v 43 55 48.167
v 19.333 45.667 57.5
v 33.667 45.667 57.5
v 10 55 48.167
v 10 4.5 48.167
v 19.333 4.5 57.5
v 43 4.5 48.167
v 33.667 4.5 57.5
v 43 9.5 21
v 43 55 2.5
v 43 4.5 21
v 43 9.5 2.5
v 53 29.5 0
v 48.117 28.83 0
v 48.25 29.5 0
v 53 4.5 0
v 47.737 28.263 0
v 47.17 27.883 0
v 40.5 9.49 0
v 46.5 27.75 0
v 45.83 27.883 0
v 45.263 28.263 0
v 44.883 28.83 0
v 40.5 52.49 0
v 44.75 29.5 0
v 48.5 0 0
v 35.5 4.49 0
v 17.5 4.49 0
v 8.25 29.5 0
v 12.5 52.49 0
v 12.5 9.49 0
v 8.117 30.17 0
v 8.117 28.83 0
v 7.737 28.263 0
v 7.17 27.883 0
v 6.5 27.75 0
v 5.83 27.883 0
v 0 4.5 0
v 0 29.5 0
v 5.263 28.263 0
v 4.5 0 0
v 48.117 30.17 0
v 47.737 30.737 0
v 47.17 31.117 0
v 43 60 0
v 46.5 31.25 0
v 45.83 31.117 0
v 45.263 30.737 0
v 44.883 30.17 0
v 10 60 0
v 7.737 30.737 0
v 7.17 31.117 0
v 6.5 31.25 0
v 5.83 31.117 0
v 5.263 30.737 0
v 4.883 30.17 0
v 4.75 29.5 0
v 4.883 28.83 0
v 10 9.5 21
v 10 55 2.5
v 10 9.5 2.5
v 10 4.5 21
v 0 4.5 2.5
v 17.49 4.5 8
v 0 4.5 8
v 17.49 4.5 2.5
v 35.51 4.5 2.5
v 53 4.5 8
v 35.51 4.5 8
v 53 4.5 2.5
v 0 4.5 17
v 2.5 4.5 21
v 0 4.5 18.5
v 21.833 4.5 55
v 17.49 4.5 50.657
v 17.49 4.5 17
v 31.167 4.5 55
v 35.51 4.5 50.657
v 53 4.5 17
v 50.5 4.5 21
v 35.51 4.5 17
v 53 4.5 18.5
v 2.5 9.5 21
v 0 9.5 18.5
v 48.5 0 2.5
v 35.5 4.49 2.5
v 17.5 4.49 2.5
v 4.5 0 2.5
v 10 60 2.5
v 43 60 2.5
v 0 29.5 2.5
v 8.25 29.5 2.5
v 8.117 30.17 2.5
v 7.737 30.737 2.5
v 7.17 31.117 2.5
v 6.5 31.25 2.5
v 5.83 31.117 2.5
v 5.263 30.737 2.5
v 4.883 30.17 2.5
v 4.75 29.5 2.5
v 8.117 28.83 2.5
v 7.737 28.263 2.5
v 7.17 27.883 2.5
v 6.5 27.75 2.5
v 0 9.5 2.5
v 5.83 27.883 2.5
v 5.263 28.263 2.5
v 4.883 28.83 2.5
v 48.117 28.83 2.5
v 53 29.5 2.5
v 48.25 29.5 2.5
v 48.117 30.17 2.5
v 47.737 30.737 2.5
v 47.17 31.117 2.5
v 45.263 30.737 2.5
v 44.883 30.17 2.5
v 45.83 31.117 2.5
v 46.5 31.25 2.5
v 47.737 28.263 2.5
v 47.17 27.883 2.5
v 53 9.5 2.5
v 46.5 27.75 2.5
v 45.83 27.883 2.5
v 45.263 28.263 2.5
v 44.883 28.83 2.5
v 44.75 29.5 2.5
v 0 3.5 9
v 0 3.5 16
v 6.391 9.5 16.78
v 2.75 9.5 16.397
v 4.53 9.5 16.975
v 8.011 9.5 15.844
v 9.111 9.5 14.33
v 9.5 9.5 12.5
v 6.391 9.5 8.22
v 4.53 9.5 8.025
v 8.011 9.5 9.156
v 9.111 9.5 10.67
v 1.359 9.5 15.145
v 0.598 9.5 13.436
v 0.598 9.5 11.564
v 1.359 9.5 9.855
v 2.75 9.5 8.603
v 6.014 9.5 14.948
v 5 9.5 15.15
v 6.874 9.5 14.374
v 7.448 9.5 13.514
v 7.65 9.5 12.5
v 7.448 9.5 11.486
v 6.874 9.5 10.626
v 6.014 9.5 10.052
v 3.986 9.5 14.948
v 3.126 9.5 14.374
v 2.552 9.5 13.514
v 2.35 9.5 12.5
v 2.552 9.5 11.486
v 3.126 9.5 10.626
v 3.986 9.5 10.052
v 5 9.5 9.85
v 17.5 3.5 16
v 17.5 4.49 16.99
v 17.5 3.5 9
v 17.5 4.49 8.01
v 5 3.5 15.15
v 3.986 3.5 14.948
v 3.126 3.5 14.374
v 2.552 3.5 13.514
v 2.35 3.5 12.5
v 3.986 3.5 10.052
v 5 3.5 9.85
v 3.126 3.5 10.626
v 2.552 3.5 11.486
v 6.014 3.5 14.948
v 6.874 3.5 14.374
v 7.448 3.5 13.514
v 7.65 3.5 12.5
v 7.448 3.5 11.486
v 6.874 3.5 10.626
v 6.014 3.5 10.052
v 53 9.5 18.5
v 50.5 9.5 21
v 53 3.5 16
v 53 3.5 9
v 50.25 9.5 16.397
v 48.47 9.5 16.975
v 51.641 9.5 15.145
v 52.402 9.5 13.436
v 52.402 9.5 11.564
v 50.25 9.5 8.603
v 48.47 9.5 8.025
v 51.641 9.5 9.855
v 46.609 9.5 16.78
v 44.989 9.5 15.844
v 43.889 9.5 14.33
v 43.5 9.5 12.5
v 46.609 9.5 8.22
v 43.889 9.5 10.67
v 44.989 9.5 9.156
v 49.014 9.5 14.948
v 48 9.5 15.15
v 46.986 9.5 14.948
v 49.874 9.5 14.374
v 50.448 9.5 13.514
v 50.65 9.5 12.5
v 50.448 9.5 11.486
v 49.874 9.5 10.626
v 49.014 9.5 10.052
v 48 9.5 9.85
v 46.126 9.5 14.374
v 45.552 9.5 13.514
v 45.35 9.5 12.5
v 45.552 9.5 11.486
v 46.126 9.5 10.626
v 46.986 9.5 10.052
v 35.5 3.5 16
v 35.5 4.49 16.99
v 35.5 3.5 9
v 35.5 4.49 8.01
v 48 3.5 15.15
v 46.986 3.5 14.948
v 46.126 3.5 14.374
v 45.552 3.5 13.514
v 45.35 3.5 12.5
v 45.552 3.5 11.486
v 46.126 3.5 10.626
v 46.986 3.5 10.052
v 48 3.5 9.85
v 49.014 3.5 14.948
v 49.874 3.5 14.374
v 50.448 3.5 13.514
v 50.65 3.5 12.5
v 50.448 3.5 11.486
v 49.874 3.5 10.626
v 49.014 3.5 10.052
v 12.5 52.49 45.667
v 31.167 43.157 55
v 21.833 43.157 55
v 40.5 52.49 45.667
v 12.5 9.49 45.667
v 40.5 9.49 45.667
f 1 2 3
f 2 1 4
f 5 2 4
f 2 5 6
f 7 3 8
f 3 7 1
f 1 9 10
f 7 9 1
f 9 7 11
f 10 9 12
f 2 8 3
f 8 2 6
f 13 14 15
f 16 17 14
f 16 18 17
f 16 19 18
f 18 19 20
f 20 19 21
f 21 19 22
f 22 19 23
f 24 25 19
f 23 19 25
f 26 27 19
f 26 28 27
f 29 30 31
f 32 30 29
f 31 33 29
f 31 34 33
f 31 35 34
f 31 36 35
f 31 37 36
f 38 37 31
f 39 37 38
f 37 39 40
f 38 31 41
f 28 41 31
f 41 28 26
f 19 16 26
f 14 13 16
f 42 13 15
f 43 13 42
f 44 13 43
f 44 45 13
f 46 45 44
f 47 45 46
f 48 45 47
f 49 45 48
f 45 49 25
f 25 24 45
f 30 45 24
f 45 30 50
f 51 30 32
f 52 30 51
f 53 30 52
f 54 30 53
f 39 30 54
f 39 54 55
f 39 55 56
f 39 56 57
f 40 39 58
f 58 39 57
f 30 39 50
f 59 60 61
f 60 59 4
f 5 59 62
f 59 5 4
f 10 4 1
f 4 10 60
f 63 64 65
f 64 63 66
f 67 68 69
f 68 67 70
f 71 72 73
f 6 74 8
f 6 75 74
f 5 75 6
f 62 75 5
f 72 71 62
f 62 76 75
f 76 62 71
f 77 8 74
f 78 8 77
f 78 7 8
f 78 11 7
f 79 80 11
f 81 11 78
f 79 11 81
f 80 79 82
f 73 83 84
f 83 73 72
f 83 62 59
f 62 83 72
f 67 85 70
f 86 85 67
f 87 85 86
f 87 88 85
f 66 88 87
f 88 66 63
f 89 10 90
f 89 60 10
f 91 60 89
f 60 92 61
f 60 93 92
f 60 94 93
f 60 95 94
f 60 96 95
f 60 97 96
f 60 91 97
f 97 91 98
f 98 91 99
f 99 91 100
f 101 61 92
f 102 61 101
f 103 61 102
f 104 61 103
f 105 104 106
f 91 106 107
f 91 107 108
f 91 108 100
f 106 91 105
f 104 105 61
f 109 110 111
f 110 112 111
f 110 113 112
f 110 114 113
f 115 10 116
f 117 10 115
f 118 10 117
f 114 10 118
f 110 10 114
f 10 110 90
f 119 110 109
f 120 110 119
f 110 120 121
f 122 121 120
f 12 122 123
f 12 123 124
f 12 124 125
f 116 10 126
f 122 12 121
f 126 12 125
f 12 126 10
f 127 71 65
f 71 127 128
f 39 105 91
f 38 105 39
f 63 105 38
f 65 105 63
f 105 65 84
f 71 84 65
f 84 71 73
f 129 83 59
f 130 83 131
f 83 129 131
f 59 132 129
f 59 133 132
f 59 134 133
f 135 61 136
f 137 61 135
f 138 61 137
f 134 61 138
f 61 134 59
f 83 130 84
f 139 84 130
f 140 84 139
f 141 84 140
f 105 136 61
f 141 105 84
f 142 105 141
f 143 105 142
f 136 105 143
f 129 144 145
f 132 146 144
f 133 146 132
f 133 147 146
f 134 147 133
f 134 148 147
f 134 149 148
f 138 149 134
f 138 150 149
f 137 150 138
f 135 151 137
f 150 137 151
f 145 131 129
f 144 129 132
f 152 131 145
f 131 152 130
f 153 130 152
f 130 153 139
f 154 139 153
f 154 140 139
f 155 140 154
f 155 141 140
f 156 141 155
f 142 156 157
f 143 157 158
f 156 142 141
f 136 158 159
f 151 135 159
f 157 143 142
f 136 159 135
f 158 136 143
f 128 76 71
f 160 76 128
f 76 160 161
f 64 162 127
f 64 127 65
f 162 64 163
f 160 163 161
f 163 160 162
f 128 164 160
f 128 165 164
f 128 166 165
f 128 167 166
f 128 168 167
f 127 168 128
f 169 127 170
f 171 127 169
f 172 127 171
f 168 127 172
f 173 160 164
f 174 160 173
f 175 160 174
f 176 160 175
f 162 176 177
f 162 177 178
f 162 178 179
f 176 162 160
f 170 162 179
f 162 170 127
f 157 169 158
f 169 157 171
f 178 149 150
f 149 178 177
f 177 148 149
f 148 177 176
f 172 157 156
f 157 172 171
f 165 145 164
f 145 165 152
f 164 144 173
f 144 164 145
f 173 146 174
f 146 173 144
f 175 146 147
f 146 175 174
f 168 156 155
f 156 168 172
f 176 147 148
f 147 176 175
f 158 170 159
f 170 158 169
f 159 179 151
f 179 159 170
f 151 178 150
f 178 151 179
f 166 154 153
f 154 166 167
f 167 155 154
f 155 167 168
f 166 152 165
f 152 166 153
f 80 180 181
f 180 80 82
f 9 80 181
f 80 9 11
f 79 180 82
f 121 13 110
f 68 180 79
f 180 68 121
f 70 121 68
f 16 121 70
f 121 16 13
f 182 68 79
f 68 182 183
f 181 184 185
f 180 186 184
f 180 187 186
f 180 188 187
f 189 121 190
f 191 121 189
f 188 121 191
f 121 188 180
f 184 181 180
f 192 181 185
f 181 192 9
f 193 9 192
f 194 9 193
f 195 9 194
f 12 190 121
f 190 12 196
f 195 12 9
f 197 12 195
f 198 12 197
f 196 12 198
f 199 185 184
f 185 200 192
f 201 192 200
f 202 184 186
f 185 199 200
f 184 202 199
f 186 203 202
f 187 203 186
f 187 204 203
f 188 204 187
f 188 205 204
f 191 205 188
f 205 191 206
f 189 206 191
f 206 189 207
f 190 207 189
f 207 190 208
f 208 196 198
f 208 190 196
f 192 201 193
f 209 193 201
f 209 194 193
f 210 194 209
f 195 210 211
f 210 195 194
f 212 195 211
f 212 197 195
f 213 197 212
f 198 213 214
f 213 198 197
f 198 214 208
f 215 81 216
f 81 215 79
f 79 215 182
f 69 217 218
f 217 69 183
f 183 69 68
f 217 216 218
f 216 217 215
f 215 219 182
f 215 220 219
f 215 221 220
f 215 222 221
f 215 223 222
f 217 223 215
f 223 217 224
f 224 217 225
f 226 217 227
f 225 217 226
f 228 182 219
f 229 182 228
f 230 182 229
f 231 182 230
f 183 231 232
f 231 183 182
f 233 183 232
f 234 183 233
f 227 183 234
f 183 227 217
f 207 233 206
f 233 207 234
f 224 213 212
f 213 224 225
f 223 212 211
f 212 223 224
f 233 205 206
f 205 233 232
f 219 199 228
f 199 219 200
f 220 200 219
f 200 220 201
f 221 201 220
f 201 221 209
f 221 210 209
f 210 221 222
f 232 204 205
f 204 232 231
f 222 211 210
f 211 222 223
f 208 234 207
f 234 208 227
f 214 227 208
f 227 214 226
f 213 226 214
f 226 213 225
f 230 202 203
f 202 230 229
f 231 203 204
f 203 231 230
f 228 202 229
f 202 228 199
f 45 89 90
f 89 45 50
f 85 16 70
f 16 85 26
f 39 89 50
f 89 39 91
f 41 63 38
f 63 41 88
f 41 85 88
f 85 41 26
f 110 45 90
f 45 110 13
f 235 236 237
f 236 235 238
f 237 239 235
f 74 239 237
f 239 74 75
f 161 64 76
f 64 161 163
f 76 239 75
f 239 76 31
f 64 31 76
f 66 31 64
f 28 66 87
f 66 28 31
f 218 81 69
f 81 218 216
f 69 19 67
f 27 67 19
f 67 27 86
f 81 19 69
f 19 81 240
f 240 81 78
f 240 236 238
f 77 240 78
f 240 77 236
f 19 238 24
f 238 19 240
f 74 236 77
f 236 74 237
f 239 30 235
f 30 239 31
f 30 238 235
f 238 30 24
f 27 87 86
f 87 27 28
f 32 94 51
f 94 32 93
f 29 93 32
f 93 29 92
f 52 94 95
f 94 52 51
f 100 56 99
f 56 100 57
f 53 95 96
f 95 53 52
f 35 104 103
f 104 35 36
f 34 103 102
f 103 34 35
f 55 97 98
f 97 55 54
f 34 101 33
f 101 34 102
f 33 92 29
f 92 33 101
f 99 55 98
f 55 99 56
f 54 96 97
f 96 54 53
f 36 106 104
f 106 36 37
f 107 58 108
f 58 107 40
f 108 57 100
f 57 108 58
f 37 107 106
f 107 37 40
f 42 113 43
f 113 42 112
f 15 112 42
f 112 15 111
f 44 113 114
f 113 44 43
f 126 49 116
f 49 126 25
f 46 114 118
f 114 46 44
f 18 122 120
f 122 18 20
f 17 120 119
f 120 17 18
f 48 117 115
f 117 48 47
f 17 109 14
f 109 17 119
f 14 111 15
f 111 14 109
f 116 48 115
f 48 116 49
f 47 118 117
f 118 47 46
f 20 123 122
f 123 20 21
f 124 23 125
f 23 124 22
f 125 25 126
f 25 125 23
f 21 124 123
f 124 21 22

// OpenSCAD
// preview[view:northeast, tilt:topdiagonal]

/* [Basic] */
// Thickness of walls
t=2.5;
// extra space behind the plug for wires
sock_ex_h=34;   

/* [Advanced] */
sock_w=28;
sock_d=48;
sock_h=21;
// extra faceplate on bottom
sock_ex_b=4.5;
// extra faceplate on top
sock_ex_t=7.5;
sock_fillet=5;

// Overall width
f_w=48+2*t;

/* [Hidden] */
f_d=sock_d+sock_ex_b+sock_ex_t;
f_corner=(f_w-sock_w-2*t)/2;

e=0.01;

power_plug();

module mount_screw() {
  // screw hole
  translate([0,0,-e]) cylinder(2*t+2*e, d=3.5, $fn=16);
  // nut clearout
  translate([0,0,t+e]) rotate(30) cylinder(sock_h+sock_ex_h+2*t+2*e, d=7, $fn=6);
}

module mount_ear() {
  w=f_corner;
  tt=5;
  
  difference() {
    union() {
      cube_fillet([w,tt,sock_h-t], top=[0,2.5]);
      translate([0,-1,(20-9)/2])
        cube_fillet([w+sock_fillet+t,1,9], bottom=[0,0,1], top=[0,0,1]);
    }
    // M5 screw
    translate([w/2,0,20/2]) rotate([-90]) {
      translate([0,0,-1-e]) cylinder(tt+1+2*e, d=5.3, $fn=16);
      // screw cap
      translate([0,0,5]) cylinder(tt-5+2*e, d=9);
    }
  }
}

module power_plug() {
difference() {
  union() {
    // faceplate
    linear_extrude(height=t) polygon([
      [0,sock_ex_b], [sock_ex_b,0], [f_w-sock_ex_b,0], [f_w,sock_ex_b],
      [f_w,sock_ex_b+25], [f_w-f_corner,f_d], [f_corner,f_d],
      [0,sock_ex_b+25]
    ]);
    // sock body
    translate([f_corner,sock_ex_b,0])
      cube_fillet([sock_w+2*t, sock_d+t, sock_h+sock_ex_h+t],
        top=[sock_w/3,sock_w/3,0,sock_w/3]);

    translate([0,sock_ex_b,t]) {
      // left mounting ear
      mount_ear();
      // right mounting ear
      translate([f_w,0,0]) mirror([1]) mount_ear();
    }
  }
  
  // begin difference
  // main socket hole
  translate([(f_w-sock_w)/2,sock_ex_b-e,-e])
    cube_fillet([sock_w, sock_d, sock_h+sock_ex_h+e],
      vertical=[0,0,sock_fillet,sock_fillet], top=[sock_w/3,sock_w/3,0,sock_w/3]);
  // screw holes
  translate([(f_w-40)/2,25+sock_ex_b,0]) {
    mount_screw();
    translate([40,0,0]) mount_screw();
  }

}
} /* end module power_plug */

/** END OF POWER_PLUG - BEGIN INCLUDES **/
module nut(d,h,horizontal=true){
    cornerdiameter =  (d / 2) / cos (180 / 6);
    cylinder(h = h, r = cornerdiameter, $fn = 6);
    if(horizontal){
        for(i = [1:6]){
            rotate([0,0,60*i]) translate([-cornerdiameter-0.2,0,0]) rotate([0,0,-45]) cube([2,2,h]);
        }
    }
}

module fillet(radius, height=100, $fn=$fn) {
  if (radius > 0) {
    //this creates acutal fillet
    translate([-radius, -radius, -height / 2 - 0.02]) difference() {
        cube([radius * 2, radius * 2, height + 0.04]);
        if ($fn == 0 && (radius == 2 || radius == 3 || radius == 4)) {
            cylinder(r=radius, h=height + 0.04, $fn=4 * radius);
        } else {
            cylinder(r=radius, h=height + 0.04, $fn=$fn);
        }

    }
  }
}

module cube_fillet(size, radius=-1, vertical=[0,0,0,0], top=[0,0,0,0], bottom=[0,0,0,0], center=false, $fn=4){
    if (center) {
        cube_fillet_inside(size, radius, vertical, top, bottom, $fn);
    } else {
        translate([size[0]/2, size[1]/2, size[2]/2])
            cube_fillet_inside(size, radius, vertical, top, bottom, $fn);
    }
}

module cube_negative_fillet(size, radius=-1, vertical=[3,3,3,3], top=[0,0,0,0], bottom=[0,0,0,0], $fn=$fn){
    j=[1,0,1,0];

    for (i=[0:3]) {
        if (radius > -1) {
            rotate([0, 0, 90*i]) translate([size[1-j[i]]/2, size[j[i]]/2, 0]) fillet(radius, size[2], $fn);
        } else {
            rotate([0, 0, 90*i]) translate([size[1-j[i]]/2, size[j[i]]/2, 0]) fillet(vertical[i], size[2], $fn);
        }
        rotate([90*i, -90, 0]) translate([size[2]/2, size[j[i]]/2, 0 ]) fillet(top[i], size[1-j[i]], $fn);
        rotate([90*(4-i), 90, 0]) translate([size[2]/2, size[j[i]]/2, 0]) fillet(bottom[i], size[1-j[i]], $fn);

    }
}

module cube_fillet_inside(size, radius=-1, vertical=[3,3,3,3], top=[0,0,0,0], bottom=[0,0,0,0], $fn=$fn){
    //makes CENTERED cube with round corners
    // if you give it radius, it will fillet vertical corners.
    //othervise use vertical, top, bottom arrays
    //when viewed from top, it starts in upper right corner (+x,+y quadrant) , goes counterclockwise
    //top/bottom fillet starts in direction of Y axis and goes CCW too

    if (radius == 0) {
        cube(size, center=true);
    } else {
        difference() {
            cube(size, center=true);
            cube_negative_fillet(size, radius, vertical, top, bottom, $fn);
        }
    }
}
